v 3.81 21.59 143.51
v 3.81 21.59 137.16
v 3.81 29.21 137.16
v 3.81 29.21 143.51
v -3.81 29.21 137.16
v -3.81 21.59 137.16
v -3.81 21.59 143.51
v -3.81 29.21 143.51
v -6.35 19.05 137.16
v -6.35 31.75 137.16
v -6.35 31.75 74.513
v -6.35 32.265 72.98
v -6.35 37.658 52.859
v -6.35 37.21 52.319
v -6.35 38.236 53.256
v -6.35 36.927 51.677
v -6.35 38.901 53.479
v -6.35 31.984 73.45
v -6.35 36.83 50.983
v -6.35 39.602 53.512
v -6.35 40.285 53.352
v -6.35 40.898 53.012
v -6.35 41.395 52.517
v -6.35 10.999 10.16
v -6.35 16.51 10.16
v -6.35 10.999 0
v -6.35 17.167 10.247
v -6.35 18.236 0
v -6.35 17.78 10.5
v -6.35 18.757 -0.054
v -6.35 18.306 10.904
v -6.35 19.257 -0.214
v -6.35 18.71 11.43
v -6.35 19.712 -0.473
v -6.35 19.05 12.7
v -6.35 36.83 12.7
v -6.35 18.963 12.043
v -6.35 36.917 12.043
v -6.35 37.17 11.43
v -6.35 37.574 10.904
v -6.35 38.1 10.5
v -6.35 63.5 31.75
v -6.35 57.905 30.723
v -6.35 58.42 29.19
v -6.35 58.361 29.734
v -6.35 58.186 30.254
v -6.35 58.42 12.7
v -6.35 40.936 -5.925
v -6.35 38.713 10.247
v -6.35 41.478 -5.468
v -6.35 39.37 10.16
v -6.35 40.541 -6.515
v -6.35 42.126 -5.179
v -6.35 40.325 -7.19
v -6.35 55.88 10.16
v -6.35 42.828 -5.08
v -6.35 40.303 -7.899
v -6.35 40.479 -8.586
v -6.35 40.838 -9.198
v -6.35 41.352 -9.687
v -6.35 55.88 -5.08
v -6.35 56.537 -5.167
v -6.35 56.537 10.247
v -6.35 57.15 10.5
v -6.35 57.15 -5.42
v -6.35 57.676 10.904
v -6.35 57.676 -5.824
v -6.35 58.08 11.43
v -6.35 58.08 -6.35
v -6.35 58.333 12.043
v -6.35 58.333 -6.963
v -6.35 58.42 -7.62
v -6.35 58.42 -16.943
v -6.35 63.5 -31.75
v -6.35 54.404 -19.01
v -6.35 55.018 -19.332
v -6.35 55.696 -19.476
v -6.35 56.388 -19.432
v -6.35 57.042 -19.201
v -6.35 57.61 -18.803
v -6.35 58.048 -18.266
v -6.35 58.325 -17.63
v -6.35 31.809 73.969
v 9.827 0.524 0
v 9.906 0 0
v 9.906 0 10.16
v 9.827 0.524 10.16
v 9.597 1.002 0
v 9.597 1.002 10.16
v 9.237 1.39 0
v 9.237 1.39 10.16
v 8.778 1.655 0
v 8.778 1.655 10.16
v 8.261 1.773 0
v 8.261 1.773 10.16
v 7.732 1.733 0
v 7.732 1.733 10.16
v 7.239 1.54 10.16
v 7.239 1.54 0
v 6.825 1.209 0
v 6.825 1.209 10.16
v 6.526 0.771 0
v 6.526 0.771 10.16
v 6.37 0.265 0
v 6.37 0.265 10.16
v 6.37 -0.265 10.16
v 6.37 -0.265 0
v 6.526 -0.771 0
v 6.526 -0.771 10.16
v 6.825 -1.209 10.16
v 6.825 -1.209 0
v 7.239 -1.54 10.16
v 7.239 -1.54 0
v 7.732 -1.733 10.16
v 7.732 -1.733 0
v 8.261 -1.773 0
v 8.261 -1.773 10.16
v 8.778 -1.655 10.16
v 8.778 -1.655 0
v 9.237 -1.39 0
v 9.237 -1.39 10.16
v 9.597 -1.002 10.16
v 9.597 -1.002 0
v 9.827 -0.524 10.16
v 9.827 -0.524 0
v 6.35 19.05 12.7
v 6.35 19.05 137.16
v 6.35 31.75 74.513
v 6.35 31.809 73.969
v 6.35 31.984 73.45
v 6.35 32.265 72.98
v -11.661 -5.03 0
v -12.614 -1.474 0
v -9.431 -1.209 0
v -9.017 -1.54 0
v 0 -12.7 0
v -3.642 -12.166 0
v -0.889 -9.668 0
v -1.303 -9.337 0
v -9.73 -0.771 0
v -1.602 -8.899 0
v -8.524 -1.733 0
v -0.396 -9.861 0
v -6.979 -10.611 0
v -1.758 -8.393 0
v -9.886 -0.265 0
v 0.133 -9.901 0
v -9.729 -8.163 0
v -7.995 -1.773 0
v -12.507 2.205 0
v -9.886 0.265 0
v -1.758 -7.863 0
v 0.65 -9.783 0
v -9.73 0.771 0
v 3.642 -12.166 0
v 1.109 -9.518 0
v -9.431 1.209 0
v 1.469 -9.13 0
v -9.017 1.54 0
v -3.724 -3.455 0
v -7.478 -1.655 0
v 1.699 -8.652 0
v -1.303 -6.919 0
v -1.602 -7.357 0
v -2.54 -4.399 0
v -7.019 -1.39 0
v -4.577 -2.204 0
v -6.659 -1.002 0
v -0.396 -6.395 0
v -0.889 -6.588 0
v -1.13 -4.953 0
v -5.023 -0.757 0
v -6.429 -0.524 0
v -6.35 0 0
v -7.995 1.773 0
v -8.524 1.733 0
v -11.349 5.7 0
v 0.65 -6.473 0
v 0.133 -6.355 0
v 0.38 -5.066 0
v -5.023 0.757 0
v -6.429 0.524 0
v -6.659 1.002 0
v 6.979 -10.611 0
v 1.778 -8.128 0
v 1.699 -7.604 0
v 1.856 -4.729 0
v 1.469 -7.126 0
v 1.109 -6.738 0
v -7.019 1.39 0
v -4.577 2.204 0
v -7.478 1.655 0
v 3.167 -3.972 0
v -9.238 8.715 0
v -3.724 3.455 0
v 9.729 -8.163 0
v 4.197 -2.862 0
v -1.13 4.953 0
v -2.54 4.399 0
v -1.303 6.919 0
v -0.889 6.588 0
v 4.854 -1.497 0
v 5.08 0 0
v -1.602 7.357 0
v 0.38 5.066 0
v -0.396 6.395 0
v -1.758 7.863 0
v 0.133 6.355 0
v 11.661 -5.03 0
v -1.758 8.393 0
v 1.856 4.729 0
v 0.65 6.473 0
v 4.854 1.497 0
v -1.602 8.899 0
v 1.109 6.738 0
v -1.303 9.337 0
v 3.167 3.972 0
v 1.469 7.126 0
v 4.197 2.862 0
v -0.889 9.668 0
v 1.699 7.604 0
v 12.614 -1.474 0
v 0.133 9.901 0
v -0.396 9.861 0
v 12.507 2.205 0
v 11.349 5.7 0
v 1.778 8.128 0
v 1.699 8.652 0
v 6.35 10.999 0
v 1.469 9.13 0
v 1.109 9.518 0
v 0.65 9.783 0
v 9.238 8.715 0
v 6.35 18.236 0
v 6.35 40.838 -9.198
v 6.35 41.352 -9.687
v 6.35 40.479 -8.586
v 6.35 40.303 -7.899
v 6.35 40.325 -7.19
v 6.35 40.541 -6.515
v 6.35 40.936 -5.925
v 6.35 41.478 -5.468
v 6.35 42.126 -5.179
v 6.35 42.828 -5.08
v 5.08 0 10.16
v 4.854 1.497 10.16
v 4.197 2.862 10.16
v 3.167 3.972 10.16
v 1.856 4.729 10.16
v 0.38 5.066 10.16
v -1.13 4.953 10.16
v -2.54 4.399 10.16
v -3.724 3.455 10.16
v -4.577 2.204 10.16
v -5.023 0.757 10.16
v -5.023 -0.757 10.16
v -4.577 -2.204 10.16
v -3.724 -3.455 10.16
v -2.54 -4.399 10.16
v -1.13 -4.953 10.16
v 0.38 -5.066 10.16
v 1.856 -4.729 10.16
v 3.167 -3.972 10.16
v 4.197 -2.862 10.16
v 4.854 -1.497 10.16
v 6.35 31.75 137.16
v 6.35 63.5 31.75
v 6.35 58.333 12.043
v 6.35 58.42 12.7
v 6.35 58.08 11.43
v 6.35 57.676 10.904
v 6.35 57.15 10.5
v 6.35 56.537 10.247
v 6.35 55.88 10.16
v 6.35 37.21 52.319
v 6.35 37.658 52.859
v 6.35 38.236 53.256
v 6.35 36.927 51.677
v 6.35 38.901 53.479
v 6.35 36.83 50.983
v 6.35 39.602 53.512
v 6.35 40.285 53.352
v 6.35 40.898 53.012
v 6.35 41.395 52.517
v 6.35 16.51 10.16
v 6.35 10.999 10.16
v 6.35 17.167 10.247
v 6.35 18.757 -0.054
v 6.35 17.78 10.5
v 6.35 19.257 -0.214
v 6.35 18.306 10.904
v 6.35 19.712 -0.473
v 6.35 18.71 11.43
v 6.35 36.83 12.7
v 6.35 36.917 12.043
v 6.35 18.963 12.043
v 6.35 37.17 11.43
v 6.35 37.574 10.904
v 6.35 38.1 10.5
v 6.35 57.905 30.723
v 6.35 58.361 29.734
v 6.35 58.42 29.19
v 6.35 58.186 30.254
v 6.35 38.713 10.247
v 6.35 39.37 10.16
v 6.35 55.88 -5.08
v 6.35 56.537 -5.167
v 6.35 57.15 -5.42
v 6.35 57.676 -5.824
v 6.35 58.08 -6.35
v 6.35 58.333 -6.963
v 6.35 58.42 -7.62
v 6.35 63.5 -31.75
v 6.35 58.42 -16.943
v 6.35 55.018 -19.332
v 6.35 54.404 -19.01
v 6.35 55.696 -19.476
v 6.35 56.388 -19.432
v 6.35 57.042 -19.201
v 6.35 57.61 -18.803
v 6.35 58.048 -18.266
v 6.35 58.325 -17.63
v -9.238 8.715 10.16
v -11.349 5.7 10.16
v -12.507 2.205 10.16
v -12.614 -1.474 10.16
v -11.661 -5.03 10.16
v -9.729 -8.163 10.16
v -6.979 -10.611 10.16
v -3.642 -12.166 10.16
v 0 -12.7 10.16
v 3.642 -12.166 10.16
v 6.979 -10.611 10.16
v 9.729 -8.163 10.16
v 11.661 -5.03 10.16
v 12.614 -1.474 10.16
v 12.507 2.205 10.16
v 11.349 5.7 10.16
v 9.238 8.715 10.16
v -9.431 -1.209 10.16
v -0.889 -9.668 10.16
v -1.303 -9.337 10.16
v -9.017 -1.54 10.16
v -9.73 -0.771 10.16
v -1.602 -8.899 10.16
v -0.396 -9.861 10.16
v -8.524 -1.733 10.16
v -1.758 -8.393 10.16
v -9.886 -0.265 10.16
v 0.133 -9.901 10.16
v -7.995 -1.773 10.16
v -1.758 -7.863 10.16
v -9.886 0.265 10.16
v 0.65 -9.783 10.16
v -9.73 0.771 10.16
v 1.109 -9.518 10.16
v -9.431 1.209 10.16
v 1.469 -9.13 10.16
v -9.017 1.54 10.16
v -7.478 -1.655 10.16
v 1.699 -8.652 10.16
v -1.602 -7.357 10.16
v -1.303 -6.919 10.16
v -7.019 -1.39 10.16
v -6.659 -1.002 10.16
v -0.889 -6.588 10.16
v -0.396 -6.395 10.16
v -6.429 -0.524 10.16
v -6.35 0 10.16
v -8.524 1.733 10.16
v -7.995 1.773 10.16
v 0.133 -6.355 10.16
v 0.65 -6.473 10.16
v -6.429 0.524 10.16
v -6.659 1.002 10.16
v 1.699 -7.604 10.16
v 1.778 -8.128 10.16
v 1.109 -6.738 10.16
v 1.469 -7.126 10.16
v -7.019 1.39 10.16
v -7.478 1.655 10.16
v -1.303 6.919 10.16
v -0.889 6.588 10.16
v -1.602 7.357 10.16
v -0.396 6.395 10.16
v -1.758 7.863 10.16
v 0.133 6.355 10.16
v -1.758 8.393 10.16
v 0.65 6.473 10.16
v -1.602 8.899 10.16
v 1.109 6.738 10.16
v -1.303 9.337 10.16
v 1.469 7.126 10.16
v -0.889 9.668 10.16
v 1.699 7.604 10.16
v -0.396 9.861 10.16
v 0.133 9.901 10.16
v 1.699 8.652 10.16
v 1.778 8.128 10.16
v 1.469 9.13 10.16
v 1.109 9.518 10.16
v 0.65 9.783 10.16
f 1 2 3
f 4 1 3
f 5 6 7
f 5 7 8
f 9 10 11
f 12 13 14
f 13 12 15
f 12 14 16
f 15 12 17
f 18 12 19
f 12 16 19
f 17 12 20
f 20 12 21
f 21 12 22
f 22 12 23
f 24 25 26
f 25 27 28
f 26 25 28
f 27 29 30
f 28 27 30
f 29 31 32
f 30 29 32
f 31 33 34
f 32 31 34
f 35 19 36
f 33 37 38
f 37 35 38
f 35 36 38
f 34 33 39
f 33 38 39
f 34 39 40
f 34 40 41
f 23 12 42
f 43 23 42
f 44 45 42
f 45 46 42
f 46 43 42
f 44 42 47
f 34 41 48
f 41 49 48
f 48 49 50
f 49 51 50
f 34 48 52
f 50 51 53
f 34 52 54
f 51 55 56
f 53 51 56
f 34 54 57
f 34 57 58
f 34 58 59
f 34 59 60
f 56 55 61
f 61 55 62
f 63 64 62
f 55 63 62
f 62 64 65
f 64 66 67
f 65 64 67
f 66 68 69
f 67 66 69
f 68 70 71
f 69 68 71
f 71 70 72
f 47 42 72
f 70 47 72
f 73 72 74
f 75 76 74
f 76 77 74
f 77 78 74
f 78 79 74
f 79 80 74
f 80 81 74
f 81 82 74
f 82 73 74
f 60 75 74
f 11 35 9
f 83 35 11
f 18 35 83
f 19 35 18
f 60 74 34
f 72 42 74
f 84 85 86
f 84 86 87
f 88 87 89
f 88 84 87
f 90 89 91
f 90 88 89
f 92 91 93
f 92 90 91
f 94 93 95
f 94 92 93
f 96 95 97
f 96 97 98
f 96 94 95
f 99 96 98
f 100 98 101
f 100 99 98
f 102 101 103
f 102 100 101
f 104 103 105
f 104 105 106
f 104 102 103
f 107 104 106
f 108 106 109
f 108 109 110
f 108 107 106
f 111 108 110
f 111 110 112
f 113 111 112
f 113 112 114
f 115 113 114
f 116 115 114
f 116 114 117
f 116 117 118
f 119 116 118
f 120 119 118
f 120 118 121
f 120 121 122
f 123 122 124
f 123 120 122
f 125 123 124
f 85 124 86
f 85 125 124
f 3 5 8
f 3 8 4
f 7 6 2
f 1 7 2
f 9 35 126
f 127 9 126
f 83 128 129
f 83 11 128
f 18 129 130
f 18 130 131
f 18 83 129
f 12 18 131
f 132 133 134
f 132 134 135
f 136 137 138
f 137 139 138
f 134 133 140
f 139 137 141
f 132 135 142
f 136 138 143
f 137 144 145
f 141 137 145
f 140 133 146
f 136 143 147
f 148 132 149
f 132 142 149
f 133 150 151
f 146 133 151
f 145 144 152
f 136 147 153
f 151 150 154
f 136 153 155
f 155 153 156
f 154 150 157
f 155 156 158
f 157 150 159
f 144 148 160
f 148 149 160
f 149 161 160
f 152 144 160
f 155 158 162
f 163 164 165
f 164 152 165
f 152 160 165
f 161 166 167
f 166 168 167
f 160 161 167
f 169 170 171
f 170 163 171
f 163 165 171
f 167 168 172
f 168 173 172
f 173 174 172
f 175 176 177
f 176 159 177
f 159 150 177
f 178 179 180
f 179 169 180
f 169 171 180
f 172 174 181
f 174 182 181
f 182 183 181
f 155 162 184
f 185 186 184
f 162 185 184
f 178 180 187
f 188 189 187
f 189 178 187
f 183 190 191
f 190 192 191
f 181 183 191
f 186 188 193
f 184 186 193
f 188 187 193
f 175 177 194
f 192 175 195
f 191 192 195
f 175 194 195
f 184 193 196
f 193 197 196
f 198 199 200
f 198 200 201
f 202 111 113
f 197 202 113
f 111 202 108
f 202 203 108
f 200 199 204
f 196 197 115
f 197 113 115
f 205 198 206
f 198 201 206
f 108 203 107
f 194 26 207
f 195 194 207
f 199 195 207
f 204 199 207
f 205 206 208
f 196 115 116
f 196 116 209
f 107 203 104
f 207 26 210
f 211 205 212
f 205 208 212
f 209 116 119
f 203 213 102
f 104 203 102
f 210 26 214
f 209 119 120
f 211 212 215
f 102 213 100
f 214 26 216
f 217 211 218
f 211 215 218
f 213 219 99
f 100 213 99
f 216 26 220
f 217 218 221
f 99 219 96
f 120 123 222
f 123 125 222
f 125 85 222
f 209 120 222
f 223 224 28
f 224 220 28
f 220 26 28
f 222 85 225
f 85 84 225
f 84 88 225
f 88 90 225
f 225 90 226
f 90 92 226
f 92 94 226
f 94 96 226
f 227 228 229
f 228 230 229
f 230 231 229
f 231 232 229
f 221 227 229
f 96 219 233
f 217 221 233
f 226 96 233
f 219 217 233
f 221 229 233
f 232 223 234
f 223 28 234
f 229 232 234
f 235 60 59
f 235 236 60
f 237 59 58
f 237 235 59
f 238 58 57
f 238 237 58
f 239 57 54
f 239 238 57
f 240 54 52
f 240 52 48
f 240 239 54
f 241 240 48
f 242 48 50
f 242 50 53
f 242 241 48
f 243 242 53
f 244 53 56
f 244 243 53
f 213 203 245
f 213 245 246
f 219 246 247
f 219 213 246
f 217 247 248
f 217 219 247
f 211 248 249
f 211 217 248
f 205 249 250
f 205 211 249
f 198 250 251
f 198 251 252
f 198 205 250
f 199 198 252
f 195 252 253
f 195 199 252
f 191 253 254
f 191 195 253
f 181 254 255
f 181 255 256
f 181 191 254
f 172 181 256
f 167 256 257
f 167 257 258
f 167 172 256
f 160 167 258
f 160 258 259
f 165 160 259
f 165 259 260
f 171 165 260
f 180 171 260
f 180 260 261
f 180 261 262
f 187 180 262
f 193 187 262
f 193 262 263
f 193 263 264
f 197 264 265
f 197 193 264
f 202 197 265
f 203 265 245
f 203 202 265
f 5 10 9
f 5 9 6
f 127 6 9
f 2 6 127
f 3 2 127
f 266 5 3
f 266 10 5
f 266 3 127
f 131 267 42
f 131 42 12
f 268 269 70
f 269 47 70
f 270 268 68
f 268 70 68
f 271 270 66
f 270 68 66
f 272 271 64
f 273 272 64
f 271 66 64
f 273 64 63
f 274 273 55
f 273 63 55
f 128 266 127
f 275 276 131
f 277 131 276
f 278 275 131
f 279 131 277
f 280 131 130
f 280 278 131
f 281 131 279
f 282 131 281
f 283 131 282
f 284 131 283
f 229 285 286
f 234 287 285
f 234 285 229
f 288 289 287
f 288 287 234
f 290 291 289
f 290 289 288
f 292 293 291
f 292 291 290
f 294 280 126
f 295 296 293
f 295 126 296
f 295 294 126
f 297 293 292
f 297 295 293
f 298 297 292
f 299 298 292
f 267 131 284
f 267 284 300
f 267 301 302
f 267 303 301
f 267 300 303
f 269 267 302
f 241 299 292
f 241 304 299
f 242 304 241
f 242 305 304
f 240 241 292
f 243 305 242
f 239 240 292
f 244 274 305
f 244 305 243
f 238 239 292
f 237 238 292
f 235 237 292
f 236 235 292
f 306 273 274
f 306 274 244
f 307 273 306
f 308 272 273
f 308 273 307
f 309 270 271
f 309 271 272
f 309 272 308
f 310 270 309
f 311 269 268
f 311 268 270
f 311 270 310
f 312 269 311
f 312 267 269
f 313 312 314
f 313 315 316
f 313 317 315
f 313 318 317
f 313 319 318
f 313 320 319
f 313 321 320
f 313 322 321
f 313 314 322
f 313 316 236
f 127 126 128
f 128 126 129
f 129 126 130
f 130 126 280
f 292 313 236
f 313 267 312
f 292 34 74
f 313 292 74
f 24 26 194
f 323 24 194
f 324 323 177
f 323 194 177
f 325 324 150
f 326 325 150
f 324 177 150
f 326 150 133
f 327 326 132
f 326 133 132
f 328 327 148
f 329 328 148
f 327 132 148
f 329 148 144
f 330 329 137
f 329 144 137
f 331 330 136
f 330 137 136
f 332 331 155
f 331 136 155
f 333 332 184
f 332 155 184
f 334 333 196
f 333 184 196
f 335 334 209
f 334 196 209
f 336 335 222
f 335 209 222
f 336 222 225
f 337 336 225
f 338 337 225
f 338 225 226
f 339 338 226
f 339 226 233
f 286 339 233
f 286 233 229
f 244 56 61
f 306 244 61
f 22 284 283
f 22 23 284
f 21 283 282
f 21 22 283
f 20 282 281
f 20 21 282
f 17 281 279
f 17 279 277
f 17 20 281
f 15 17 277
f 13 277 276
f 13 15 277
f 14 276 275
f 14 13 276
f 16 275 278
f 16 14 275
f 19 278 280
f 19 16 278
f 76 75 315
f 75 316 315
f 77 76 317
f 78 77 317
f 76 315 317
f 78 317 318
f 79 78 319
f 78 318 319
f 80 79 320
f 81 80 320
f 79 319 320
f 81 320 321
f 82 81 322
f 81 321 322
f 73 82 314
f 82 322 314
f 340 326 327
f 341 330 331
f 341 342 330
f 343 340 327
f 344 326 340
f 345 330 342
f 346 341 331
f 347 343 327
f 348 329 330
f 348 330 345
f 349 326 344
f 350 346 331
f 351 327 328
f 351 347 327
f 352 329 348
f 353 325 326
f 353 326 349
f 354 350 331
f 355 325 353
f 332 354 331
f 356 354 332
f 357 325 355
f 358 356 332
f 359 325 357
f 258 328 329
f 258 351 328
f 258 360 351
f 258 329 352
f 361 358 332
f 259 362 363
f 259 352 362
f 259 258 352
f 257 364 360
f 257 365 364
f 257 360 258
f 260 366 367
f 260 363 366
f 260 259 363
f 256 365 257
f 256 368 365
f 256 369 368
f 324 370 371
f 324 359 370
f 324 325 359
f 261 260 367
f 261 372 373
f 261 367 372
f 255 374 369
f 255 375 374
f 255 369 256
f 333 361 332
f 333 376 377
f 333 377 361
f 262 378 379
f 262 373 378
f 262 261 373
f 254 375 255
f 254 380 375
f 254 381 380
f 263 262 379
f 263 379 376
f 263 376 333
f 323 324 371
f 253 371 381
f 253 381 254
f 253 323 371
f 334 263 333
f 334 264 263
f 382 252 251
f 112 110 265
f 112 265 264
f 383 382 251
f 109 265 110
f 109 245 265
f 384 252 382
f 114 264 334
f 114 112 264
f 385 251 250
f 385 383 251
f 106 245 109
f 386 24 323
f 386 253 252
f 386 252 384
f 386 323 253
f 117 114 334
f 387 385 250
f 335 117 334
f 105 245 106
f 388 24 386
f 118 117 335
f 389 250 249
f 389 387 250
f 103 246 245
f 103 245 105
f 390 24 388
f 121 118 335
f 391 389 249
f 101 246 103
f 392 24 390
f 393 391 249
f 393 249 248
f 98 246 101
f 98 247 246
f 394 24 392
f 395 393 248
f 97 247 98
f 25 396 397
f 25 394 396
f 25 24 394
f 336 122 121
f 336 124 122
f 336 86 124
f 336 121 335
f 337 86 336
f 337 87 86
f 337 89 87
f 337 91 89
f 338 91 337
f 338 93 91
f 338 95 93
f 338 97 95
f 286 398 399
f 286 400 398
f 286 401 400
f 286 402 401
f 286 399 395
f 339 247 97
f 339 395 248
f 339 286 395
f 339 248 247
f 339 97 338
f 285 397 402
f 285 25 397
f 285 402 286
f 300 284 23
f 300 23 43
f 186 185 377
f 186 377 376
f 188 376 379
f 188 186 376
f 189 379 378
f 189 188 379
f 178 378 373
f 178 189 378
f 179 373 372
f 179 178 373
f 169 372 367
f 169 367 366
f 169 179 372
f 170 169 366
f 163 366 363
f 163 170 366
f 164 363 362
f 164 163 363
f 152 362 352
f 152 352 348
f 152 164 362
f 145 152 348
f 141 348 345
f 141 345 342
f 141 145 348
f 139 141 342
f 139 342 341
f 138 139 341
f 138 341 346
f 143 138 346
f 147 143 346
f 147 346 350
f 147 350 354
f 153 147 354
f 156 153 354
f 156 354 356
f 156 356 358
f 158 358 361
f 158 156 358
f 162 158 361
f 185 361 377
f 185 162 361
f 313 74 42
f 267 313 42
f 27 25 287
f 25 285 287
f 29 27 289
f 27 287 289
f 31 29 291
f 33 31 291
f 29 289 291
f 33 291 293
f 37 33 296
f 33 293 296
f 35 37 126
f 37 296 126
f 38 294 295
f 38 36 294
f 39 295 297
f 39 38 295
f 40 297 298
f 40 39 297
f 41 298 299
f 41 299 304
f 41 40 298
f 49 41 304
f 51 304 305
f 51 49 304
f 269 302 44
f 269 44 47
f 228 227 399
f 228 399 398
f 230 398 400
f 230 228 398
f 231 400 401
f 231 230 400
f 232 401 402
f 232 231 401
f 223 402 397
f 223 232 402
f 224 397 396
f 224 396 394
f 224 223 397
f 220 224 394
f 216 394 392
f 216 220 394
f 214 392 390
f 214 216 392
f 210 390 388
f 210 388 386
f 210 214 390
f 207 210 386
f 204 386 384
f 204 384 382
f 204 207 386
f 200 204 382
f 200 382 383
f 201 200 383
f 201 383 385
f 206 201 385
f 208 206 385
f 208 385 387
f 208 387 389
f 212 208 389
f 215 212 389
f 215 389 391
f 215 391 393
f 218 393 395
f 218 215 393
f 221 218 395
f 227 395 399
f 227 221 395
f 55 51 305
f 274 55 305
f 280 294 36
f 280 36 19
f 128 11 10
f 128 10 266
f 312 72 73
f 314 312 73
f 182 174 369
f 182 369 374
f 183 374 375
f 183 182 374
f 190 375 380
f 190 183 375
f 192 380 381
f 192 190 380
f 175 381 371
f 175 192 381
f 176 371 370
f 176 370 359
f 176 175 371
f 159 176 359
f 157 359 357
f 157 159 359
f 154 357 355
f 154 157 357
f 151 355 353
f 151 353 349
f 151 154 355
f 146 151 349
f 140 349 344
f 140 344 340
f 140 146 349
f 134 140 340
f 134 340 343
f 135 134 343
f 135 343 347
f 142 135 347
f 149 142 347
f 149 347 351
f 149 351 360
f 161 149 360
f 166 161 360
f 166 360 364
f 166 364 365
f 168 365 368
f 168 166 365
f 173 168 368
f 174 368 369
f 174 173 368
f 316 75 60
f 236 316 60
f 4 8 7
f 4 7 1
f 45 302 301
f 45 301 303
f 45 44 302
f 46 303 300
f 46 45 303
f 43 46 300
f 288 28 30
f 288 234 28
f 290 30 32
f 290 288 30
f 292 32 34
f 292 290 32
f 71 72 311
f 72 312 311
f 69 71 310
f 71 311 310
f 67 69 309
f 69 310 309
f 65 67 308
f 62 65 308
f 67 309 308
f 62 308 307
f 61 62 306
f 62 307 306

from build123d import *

# Parameters (mm, degrees)
SKETCH1_R           = 5.08
SKETCH1_R_2         = 1.778
BOSS_EXTRUDE1_DEPTH = 10.16
SKETCH3_W           = 12.7
SKETCH3_H           = 12.7
BOSS_EXTRUDE2_DEPTH = 127
SKETCH6_W           = 7.62
SKETCH6_H           = 7.62
BOSS_EXTRUDE3_DEPTH = 6.35
BOSS_EXTRUDE4_START = -12.7
BOSS_EXTRUDE4_DEPTH = 12.7
FILLET2_R           = 2.54
BOSS_EXTRUDE5_START = -12.7
BOSS_EXTRUDE5_DEPTH = 12.7
FILLET3_R           = 2.54


with BuildPart() as part:
    # Sketch1 → Boss-Extrude1 (new body)
    with BuildSketch(Plane.XY):
        with BuildLine():
            Line((-6.35, 12.7), (-6.35, 10.998522628))
            ThreePointArc((-6.35, 10.998522628), (0, -12.7), (6.35, 10.998522628))
            Line((6.35, 10.998522628), (6.35, 12.7))
            Line((6.35, 12.7), (6.35, 63.5))
            Line((6.35, 63.5), (-6.35, 63.5))
            Line((-6.35, 63.5), (-6.35, 12.7))
        make_face()
        Circle(SKETCH1_R, mode=Mode.SUBTRACT)
        with Locations((0, 8.128)):
            Circle(SKETCH1_R_2, mode=Mode.SUBTRACT)
        with Locations((8.128, 0)):
            Circle(SKETCH1_R_2, mode=Mode.SUBTRACT)
        with Locations((0, -8.128)):
            Circle(SKETCH1_R_2, mode=Mode.SUBTRACT)
        with Locations((-8.128, 0)):
            Circle(SKETCH1_R_2, mode=Mode.SUBTRACT)
    extrude(amount=BOSS_EXTRUDE1_DEPTH)

    # Sketch3 → Boss-Extrude2 (add)
    with BuildSketch(Plane.XY.offset(10.16)):
        with Locations((0, 25.4)):
            Rectangle(SKETCH3_W, SKETCH3_H)
    extrude(amount=BOSS_EXTRUDE2_DEPTH)

    # Sketch6 → Boss-Extrude3 (add)
    with BuildSketch(Plane.XY.offset(137.16)):
        with Locations((0, 25.4)):
            Rectangle(SKETCH6_W, SKETCH6_H)
    extrude(amount=BOSS_EXTRUDE3_DEPTH)

    # Sketch5 → Boss-Extrude4 (add)
    with BuildSketch(Plane.ZY.offset(6.35).offset(BOSS_EXTRUDE4_START)):
        Polygon((10.16, 63.5), (31.75, 63.5), (73.66, 31.75), (10.16, 31.75), (10.16, 36.83), (58.541821836, 36.83), (30.043021836, 58.42), (10.16, 58.42), align=None)
    extrude(amount=BOSS_EXTRUDE4_DEPTH)

    # Fillet2
    fillet2_edges = [part.edges().sort_by_distance(p)[0] for p in [
        (0, 31.75, 73.66),
    ]]
    fillet(fillet2_edges, radius=FILLET2_R)

    # Sketch7 → Boss-Extrude5 (add)
    with BuildSketch(Plane(origin=(6.35, 0, 0), x_dir=(0, 0, -1), z_dir=(1, 0, 0)).offset(BOSS_EXTRUDE5_START)):
        Polygon((0, 63.5), (0, 19.05), (31.75, 63.5), align=None)
        Polygon((5.08, 58.42), (21.878598235, 58.42), (5.08, 34.901962471), align=None, mode=Mode.SUBTRACT)
    extrude(amount=BOSS_EXTRUDE5_DEPTH)

    # Fillet3
    fillet3_edges = [part.edges().sort_by_distance(p)[0] for p in [
        (0, 19.05, 0),
        (0, 34.901962471, -5.08),
        (0, 58.42, -5.08),
        (0, 58.42, -21.878598235),
        (0, 19.05, 10.16),
        (0, 58.42, 10.16),
        (0, 58.42, 30.043021836),
        (0, 36.83, 58.541821836),
        (0, 36.83, 10.16),
    ]]
    fillet(fillet3_edges, radius=FILLET3_R)


solid = part.part
